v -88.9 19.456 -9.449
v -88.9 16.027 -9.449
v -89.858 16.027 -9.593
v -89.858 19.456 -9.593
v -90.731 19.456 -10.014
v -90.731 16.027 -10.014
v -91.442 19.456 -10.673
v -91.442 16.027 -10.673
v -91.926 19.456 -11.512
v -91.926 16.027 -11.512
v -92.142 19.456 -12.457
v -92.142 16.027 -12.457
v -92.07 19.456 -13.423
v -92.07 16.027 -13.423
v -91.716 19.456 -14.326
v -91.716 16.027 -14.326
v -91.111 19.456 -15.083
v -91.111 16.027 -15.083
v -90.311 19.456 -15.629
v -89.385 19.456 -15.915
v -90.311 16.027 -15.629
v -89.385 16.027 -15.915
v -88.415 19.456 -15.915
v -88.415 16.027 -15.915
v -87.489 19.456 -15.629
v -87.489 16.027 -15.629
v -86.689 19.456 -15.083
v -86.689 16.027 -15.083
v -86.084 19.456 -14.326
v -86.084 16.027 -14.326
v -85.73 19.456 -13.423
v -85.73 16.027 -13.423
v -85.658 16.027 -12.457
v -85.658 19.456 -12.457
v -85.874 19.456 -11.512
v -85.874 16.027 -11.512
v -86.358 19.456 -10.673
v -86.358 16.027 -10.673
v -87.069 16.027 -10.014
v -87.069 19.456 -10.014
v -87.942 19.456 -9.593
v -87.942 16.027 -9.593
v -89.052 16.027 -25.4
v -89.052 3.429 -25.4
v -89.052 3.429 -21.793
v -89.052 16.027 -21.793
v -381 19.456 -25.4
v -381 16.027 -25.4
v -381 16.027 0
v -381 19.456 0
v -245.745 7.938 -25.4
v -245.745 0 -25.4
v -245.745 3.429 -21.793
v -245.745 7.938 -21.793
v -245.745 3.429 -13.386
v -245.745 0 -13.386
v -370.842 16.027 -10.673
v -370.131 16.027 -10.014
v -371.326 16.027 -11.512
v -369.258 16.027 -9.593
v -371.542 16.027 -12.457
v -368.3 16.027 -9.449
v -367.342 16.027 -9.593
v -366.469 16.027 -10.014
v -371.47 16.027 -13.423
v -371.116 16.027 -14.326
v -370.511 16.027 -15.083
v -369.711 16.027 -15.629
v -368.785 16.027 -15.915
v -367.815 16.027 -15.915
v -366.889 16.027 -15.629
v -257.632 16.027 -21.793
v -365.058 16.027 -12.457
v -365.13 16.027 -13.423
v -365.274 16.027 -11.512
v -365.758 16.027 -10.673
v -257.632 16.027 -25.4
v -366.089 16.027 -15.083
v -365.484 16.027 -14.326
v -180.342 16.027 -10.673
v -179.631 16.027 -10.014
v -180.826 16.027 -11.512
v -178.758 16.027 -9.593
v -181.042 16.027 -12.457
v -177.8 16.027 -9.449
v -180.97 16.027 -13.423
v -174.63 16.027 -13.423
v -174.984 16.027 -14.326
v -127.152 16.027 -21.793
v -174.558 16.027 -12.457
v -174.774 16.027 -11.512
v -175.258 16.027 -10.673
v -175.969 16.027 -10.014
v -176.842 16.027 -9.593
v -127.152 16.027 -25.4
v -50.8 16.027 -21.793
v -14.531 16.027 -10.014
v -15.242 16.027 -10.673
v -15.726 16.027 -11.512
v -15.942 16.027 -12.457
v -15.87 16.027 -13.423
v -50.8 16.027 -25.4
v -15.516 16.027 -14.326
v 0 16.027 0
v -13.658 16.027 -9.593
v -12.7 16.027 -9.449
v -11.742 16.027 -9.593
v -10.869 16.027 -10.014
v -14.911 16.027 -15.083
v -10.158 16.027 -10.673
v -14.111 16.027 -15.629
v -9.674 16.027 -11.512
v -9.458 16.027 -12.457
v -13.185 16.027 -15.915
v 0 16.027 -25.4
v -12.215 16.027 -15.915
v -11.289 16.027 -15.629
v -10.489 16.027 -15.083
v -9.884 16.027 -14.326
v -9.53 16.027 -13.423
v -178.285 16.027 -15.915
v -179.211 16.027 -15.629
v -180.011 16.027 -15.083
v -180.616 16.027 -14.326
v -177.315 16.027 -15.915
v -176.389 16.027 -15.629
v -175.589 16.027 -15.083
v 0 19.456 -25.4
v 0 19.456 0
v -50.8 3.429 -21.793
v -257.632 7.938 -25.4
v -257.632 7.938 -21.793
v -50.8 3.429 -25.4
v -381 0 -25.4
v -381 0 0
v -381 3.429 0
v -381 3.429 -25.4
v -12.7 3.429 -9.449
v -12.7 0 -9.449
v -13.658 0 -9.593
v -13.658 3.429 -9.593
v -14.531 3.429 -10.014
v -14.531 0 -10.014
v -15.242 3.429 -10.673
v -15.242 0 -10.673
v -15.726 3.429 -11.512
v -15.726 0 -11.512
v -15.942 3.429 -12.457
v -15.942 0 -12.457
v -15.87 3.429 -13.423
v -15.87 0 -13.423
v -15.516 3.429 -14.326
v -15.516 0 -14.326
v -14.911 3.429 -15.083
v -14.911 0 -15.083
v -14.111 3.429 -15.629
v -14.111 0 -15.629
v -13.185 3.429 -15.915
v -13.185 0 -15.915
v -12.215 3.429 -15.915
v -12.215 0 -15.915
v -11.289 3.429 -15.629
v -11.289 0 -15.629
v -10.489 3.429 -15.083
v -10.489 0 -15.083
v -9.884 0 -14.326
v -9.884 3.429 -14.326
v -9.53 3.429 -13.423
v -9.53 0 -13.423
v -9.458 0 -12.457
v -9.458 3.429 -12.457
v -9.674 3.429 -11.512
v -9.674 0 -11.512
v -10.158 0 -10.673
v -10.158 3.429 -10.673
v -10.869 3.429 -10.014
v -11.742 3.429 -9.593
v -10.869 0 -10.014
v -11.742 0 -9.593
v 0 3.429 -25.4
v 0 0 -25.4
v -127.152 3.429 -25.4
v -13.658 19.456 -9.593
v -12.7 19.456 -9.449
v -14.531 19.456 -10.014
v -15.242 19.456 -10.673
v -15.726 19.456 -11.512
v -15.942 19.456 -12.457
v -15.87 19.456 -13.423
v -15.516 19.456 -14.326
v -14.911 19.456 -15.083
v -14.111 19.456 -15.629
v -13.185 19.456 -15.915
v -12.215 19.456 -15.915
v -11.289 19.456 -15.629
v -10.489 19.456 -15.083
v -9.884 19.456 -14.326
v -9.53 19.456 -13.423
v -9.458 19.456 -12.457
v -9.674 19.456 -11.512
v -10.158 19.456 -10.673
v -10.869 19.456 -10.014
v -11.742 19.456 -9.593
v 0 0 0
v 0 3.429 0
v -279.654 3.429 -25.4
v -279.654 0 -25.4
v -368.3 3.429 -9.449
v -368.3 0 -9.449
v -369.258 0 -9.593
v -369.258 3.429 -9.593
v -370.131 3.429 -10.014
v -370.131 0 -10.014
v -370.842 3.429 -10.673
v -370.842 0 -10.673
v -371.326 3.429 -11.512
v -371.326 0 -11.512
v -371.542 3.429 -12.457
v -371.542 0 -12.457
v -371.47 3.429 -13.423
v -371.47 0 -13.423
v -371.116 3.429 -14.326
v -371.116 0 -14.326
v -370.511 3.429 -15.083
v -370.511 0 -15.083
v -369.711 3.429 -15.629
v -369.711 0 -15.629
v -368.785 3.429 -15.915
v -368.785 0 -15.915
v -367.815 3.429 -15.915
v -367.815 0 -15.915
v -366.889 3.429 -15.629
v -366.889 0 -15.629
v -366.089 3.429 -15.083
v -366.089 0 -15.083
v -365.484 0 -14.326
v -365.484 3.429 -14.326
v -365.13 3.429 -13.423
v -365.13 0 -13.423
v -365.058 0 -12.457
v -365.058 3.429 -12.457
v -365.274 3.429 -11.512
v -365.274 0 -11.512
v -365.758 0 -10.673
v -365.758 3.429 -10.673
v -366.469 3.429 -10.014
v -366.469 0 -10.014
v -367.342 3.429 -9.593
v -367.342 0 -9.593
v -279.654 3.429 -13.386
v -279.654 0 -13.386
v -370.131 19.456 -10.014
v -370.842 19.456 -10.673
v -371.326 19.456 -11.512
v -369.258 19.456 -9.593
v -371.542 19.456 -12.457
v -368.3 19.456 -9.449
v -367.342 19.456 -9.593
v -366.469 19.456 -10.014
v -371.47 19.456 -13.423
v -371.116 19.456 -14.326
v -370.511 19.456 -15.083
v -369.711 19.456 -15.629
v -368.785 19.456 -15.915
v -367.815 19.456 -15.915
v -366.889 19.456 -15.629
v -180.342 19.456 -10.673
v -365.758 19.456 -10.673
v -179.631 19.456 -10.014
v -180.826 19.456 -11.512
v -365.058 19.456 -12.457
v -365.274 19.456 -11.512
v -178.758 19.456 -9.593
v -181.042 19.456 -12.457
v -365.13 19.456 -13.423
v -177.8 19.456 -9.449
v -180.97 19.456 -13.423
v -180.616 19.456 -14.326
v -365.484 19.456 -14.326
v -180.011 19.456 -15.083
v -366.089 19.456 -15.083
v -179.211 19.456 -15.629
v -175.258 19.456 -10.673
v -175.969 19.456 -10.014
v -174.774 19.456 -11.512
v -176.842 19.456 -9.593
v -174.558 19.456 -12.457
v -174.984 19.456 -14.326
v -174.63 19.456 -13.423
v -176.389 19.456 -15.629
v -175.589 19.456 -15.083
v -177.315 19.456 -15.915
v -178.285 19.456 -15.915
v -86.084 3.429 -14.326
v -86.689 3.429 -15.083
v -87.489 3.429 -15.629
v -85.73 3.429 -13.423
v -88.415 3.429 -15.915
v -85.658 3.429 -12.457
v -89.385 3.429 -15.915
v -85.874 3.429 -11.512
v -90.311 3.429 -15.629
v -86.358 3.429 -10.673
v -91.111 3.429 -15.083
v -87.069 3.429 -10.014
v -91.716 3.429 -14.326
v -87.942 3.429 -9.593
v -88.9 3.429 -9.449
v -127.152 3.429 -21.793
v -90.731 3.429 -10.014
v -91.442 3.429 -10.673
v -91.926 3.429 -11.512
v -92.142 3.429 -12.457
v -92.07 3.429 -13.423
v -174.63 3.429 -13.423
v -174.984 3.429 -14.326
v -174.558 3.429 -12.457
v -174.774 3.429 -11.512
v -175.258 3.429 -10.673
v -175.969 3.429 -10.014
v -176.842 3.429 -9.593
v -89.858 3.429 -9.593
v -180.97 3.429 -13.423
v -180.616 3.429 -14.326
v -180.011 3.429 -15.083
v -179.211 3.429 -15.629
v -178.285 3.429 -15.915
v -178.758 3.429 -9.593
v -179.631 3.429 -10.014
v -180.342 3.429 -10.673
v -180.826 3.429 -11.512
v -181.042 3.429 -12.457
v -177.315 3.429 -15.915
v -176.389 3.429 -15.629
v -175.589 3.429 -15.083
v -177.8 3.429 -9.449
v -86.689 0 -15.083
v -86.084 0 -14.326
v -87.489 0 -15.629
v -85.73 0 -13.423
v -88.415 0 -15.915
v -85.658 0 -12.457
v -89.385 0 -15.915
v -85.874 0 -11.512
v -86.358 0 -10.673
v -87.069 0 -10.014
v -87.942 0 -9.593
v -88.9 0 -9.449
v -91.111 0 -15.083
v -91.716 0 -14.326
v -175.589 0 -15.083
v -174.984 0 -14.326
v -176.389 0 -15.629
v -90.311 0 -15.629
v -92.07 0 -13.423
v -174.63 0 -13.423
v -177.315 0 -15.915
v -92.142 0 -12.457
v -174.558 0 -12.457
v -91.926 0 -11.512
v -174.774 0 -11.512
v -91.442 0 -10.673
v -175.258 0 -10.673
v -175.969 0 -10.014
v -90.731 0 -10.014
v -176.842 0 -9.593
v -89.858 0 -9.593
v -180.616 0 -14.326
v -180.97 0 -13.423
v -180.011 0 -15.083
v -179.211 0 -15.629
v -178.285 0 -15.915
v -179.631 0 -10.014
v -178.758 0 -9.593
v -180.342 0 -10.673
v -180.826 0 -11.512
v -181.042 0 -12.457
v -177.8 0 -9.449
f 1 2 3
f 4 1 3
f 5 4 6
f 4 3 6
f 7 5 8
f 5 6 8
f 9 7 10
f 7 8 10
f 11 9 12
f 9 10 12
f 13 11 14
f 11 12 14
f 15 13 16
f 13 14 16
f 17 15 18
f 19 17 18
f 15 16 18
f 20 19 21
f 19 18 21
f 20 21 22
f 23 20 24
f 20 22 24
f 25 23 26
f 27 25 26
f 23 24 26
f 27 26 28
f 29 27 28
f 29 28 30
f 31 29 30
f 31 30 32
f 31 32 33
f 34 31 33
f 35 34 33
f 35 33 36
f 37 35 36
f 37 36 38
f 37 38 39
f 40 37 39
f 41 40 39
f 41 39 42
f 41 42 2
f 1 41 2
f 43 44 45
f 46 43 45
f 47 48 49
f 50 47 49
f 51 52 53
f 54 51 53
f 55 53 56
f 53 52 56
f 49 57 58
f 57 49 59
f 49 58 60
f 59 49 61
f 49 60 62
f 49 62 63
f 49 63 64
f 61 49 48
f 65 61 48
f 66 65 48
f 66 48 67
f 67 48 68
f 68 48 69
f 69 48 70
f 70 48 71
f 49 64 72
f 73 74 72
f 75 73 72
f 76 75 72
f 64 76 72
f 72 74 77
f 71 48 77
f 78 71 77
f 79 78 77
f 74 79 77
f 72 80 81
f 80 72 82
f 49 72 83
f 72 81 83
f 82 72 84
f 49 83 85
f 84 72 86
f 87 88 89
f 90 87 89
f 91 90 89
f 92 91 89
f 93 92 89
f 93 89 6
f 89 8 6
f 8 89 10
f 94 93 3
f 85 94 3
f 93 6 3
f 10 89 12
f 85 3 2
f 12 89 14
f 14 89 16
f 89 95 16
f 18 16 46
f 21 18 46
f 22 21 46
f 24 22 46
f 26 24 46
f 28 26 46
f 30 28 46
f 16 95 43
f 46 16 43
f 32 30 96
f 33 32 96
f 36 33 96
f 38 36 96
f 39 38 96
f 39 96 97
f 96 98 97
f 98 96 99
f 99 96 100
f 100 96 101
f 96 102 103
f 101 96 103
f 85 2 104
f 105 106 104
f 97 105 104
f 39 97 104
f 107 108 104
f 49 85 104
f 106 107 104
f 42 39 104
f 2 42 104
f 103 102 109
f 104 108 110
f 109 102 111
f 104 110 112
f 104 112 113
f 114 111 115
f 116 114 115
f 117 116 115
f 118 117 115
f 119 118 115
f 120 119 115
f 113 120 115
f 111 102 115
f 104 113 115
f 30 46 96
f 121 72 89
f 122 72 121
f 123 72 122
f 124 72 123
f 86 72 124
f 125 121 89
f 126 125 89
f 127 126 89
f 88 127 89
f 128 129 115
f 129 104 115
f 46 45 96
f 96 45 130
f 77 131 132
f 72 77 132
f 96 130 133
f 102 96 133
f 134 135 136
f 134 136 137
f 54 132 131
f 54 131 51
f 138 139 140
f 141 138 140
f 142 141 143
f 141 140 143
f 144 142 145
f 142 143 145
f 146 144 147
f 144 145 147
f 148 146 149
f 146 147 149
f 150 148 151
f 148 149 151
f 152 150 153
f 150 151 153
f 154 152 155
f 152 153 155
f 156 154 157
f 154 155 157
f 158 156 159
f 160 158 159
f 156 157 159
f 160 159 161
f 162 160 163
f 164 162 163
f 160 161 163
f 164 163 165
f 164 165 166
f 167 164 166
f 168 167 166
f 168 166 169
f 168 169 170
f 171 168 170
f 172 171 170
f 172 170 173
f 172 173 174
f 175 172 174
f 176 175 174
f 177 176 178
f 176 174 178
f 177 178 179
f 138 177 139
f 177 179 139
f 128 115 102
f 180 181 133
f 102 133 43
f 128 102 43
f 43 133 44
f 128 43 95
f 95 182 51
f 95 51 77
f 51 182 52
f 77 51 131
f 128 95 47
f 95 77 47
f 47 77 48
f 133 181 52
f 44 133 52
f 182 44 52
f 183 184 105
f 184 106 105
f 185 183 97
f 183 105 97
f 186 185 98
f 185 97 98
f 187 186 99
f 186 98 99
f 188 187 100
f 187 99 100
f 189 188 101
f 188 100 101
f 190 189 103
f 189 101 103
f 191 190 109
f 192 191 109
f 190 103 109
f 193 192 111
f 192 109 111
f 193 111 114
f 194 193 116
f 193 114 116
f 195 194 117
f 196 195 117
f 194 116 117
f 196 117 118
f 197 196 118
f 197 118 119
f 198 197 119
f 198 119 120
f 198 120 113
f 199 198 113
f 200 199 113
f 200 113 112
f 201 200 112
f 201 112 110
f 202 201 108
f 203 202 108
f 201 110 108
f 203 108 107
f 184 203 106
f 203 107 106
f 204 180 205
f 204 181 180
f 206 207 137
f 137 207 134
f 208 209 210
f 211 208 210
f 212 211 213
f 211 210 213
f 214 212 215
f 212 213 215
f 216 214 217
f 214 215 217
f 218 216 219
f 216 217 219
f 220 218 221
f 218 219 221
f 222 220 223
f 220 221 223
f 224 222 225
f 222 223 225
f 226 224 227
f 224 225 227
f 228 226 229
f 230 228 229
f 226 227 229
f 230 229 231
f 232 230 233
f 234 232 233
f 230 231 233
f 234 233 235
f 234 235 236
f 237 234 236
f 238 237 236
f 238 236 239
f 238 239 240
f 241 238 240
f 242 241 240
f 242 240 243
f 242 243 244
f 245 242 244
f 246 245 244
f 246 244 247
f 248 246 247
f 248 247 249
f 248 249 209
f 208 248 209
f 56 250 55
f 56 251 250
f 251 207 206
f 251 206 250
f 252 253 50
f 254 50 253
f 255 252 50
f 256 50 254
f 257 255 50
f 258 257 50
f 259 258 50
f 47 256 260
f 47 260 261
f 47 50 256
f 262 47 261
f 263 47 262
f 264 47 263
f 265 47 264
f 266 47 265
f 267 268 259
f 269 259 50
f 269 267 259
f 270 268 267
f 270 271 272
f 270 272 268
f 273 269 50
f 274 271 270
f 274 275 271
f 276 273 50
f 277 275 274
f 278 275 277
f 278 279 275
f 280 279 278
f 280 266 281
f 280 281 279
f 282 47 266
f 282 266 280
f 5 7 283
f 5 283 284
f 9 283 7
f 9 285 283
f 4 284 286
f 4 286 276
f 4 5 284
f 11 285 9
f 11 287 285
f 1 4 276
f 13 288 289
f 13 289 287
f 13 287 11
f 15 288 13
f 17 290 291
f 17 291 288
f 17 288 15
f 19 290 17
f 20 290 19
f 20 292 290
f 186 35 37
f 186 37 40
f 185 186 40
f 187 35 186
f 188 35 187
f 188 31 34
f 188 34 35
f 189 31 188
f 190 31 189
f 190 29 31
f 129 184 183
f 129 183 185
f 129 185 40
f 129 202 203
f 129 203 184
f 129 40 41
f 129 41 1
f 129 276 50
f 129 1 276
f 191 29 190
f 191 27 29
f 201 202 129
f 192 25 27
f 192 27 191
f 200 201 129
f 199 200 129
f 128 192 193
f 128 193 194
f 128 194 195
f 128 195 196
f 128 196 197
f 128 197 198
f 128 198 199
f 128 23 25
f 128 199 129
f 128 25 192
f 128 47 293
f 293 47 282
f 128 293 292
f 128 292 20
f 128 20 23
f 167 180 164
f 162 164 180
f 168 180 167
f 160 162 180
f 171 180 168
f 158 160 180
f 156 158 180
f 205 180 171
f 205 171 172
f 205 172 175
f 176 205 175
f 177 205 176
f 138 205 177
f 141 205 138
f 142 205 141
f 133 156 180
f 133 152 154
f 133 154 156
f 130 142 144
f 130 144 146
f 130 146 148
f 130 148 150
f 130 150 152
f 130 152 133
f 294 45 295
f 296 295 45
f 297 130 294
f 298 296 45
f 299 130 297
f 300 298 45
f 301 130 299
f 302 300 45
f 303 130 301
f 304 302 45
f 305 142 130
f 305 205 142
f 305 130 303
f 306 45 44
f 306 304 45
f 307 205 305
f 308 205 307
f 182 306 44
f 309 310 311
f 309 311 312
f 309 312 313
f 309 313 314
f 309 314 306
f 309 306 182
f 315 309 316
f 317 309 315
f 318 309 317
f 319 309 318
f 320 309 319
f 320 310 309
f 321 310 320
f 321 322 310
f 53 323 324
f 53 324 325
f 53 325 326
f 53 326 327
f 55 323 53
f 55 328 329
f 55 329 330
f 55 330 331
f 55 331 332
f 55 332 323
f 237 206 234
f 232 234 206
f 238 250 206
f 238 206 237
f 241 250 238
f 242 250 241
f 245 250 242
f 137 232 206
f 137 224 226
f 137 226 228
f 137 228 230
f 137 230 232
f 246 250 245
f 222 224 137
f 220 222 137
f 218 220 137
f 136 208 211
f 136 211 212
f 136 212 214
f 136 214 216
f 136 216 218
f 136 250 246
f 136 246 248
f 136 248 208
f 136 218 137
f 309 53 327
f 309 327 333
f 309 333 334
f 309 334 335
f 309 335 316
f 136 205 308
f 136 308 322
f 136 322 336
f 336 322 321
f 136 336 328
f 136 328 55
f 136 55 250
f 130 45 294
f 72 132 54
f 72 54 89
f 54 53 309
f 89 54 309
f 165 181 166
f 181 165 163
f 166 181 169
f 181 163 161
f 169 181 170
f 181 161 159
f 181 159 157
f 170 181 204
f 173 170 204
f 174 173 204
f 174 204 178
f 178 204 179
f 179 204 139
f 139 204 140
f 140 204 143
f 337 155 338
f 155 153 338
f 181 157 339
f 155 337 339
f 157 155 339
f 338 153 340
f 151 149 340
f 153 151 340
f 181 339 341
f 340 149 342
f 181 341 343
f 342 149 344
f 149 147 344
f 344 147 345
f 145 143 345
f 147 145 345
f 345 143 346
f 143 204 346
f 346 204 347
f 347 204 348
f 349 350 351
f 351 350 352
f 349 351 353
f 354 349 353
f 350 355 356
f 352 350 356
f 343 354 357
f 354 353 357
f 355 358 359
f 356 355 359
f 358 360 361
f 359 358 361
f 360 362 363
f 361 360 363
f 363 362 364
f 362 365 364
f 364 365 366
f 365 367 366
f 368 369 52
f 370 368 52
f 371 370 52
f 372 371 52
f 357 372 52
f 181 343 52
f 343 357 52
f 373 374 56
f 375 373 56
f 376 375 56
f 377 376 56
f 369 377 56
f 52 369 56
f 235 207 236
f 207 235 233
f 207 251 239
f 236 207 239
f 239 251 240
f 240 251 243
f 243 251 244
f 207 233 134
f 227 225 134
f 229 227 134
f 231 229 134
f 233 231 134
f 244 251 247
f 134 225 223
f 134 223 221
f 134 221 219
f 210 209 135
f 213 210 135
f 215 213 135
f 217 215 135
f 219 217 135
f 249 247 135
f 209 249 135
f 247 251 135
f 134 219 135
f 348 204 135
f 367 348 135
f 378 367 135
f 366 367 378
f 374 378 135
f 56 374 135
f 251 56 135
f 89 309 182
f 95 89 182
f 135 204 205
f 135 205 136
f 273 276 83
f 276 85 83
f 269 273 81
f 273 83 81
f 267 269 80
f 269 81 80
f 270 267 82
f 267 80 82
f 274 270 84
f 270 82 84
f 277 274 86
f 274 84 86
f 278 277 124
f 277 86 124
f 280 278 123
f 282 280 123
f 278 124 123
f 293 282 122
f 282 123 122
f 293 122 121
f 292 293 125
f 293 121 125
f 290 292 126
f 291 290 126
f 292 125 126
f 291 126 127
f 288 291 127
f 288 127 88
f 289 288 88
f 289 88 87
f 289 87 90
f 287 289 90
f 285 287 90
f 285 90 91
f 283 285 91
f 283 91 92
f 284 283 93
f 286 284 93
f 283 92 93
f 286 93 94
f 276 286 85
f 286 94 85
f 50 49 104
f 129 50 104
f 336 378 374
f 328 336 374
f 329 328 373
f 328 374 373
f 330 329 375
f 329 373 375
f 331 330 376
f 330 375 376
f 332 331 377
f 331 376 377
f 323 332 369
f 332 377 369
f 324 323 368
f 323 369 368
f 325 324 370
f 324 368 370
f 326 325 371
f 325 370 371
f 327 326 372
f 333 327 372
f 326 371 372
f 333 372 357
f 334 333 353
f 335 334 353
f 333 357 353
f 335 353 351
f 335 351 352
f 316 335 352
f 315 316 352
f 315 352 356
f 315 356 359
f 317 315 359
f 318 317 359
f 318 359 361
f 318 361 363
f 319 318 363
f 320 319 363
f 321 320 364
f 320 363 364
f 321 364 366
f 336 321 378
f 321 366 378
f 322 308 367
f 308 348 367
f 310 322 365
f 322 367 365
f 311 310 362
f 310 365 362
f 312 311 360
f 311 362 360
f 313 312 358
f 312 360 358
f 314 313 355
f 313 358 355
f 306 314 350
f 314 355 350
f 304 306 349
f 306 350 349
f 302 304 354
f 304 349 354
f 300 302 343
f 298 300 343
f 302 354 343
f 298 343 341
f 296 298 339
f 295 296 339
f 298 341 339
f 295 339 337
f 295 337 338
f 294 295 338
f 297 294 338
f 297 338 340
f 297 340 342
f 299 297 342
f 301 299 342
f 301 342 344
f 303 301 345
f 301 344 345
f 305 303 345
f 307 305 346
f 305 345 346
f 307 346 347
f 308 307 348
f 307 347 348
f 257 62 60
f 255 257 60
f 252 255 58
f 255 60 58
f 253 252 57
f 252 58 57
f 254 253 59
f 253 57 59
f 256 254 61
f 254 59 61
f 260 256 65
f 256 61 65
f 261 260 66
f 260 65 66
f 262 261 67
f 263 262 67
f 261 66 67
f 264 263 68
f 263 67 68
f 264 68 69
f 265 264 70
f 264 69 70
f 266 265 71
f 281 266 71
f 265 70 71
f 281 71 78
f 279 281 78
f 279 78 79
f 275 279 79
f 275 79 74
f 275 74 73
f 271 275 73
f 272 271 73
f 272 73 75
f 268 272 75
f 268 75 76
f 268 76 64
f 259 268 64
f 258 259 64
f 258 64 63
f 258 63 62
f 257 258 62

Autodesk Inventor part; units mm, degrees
ref_plane "YZ Plane" through (0, 0, 0) normal (1, 0, 0) x (0, 1, 0)
ref_plane "XZ Plane" through (0, 0, 0) normal (0, 1, 0) x (-1, 0, 0)
ref_plane "XY Plane" through (0, 0, 0) normal (0, 0, 1) x (1, 0, 0)
sketch "Sketch1" plane through (0, 0, 0) normal (0, 1, 0) x (-1, 0, 0)
  line L0 (0, 0) -> (381, 0)
  line L1 (381, 0) -> (381, -25.4)
  line L2 (381, -25.4) -> (0, -25.4)
  line L3 (0, -25.4) -> (0, 0)
  dimension "d0" = 381
  dimension "d1" = 25.4
extrude "Extrusion1" add sketch "Sketch1" along normal blind 3.429
sketch "Sketch2" plane through (0, 3.429, 0) normal (0, 1, 0) x (1, 0, 0)
  line L0 (0, 25.4) -> (-381, 25.4) projected
  line L1 (-50.8, 25.4) -> (-89.0524, 25.4)
  line L2 (-89.0524, 25.4) -> (-89.0524, 21.7932)
  line L3 (-89.0524, 21.7932) -> (-50.8, 21.7932)
  line L4 (-50.8, 21.7932) -> (-50.8, 25.4)
  line L5 (0, 0) -> (0, 25.4) projected
  line L6 (-127.1524, 25.4) -> (-257.6322, 25.4)
  line L7 (-257.6322, 25.4) -> (-257.6322, 21.7932)
  line L8 (-257.6322, 21.7932) -> (-127.1524, 21.7932)
  line L9 (-127.1524, 21.7932) -> (-127.1524, 25.4)
  point P0 (-89.0524, 23.5966)
  dimension "d4" = 38.2524
  dimension "d5" = 3.6068
  dimension "d6" = 50.8
  dimension "d7" = 38.1
  dimension "d8" = 3.6068
  dimension "d9" = 130.4798
extrude "Extrusion2" add sketch "Sketch2" along normal blind 12.5984
sketch "Sketch3" plane through (0, 16.0274, 0) normal (0, 1, 0) x (1, 0, 0)
  line L0 (-381, 25.4) -> (-381, 0) projected
  line L1 (-257.6322, 25.4) -> (-381, 25.4) projected
  line L2 (-381, 0) -> (0, 0) projected
  line L3 (0, 0) -> (0, 25.4) projected
  line L4 (0, 25.4) -> (-381, 25.4)
  line L5 (-381, 25.4) -> (-381, 0)
  line L6 (-381, 0) -> (0, 0)
  line L7 (0, 0) -> (0, 25.4)
extrude "Extrusion3" add sketch "Sketch3" along normal blind 3.429
sketch "Sketch5" plane through (0, 19.4564, 0) normal (0, 1, 0) x (1, 0, 0)
  line L0 (0, 0) -> (0, 25.4) projected
  line L1 (0, 25.4) -> (-381, 25.4) projected
  point P0 (-12.7, 12.7)
  point P1 (-245.745, 25.4)
  dimension "d18" = 12.7
  dimension "d19" = 12.7
hole "Hole1" at (-12.7, 19.4564, -12.7) direction (0, -1, 0) diameter 6.5024 end through all
sketch "Sketch6" plane through (0, 19.4564, 0) normal (0, 1, 0) x (1, 0, 0)
  line L0 (0, 25.4) -> (-381, 25.4) projected
  line L1 (-381, 25.4) -> (-381, 0) projected
  point P0 (-177.8, 12.7)
  point P1 (-245.745, 25.4)
  dimension "d36" = 12.7
  dimension "d37" = 203.2
hole "Hole2" at (-177.8, 19.4564, -12.7) direction (0, -1, 0) diameter 6.5024 end through all
sketch "Sketch7" plane through (0, 19.4564, 0) normal (0, 1, 0) x (1, 0, 0)
  line L0 (0, 25.4) -> (-381, 25.4) projected
  line L1 (-381, 25.4) -> (-381, 0) projected
  point P0 (0, 0)
  point P1 (-368.3, 12.7)
  point P2 (-279.654, 25.4)
  dimension "d38" = 12.7
  dimension "d39" = 12.7
hole "Hole3" at (-368.3, 19.4564, -12.7) direction (0, -1, 0) diameter 6.5024 end through all
sketch "Sketch10" plane through (0, 19.4564, 0) normal (0, 1, 0) x (1, 0, 0)
  line L0 (0, 25.4) -> (-381, 25.4) projected
  line L1 (0, 0) -> (0, 25.4) projected
  point P0 (-88.9, 12.7)
  point P1 (-245.745, 25.4)
  point P2 (0, 12.7)
  dimension "d64" = 12.7
  dimension "d74" = 88.9
hole "Hole6" at (-88.9, 19.4564, -12.7) direction (0, -1, 0) diameter 6.5024 end through all
ref_plane "Work Plane2" through (0, 9.7282, 0) normal (0, 1, 0) x (1, 0, 0)
sketch "Sketch11" plane through (0, 0, 0) normal (0, -1, 0) x (1, 0, 0)
  line L0 (-279.654, -25.4) -> (-279.654, -13.3858) projected
  line L1 (-279.654, -13.3858) -> (-245.745, -13.3858) projected
  line L2 (-245.745, -25.4) -> (-245.745, -13.3858) projected
  line L3 (-245.745, -13.3858) -> (-279.654, -13.3858)
  line L4 (-279.654, -13.3858) -> (-279.654, -25.4)
  line L5 (-279.654, -25.4) -> (-245.745, -25.4)
  line L6 (-245.745, -25.4) -> (-245.745, -13.3858)
  point P0 (0, 0)
extrude "Extrusion5" cut sketch "Sketch11" against normal blind 7.9375
properties part number "ArmPart1"
